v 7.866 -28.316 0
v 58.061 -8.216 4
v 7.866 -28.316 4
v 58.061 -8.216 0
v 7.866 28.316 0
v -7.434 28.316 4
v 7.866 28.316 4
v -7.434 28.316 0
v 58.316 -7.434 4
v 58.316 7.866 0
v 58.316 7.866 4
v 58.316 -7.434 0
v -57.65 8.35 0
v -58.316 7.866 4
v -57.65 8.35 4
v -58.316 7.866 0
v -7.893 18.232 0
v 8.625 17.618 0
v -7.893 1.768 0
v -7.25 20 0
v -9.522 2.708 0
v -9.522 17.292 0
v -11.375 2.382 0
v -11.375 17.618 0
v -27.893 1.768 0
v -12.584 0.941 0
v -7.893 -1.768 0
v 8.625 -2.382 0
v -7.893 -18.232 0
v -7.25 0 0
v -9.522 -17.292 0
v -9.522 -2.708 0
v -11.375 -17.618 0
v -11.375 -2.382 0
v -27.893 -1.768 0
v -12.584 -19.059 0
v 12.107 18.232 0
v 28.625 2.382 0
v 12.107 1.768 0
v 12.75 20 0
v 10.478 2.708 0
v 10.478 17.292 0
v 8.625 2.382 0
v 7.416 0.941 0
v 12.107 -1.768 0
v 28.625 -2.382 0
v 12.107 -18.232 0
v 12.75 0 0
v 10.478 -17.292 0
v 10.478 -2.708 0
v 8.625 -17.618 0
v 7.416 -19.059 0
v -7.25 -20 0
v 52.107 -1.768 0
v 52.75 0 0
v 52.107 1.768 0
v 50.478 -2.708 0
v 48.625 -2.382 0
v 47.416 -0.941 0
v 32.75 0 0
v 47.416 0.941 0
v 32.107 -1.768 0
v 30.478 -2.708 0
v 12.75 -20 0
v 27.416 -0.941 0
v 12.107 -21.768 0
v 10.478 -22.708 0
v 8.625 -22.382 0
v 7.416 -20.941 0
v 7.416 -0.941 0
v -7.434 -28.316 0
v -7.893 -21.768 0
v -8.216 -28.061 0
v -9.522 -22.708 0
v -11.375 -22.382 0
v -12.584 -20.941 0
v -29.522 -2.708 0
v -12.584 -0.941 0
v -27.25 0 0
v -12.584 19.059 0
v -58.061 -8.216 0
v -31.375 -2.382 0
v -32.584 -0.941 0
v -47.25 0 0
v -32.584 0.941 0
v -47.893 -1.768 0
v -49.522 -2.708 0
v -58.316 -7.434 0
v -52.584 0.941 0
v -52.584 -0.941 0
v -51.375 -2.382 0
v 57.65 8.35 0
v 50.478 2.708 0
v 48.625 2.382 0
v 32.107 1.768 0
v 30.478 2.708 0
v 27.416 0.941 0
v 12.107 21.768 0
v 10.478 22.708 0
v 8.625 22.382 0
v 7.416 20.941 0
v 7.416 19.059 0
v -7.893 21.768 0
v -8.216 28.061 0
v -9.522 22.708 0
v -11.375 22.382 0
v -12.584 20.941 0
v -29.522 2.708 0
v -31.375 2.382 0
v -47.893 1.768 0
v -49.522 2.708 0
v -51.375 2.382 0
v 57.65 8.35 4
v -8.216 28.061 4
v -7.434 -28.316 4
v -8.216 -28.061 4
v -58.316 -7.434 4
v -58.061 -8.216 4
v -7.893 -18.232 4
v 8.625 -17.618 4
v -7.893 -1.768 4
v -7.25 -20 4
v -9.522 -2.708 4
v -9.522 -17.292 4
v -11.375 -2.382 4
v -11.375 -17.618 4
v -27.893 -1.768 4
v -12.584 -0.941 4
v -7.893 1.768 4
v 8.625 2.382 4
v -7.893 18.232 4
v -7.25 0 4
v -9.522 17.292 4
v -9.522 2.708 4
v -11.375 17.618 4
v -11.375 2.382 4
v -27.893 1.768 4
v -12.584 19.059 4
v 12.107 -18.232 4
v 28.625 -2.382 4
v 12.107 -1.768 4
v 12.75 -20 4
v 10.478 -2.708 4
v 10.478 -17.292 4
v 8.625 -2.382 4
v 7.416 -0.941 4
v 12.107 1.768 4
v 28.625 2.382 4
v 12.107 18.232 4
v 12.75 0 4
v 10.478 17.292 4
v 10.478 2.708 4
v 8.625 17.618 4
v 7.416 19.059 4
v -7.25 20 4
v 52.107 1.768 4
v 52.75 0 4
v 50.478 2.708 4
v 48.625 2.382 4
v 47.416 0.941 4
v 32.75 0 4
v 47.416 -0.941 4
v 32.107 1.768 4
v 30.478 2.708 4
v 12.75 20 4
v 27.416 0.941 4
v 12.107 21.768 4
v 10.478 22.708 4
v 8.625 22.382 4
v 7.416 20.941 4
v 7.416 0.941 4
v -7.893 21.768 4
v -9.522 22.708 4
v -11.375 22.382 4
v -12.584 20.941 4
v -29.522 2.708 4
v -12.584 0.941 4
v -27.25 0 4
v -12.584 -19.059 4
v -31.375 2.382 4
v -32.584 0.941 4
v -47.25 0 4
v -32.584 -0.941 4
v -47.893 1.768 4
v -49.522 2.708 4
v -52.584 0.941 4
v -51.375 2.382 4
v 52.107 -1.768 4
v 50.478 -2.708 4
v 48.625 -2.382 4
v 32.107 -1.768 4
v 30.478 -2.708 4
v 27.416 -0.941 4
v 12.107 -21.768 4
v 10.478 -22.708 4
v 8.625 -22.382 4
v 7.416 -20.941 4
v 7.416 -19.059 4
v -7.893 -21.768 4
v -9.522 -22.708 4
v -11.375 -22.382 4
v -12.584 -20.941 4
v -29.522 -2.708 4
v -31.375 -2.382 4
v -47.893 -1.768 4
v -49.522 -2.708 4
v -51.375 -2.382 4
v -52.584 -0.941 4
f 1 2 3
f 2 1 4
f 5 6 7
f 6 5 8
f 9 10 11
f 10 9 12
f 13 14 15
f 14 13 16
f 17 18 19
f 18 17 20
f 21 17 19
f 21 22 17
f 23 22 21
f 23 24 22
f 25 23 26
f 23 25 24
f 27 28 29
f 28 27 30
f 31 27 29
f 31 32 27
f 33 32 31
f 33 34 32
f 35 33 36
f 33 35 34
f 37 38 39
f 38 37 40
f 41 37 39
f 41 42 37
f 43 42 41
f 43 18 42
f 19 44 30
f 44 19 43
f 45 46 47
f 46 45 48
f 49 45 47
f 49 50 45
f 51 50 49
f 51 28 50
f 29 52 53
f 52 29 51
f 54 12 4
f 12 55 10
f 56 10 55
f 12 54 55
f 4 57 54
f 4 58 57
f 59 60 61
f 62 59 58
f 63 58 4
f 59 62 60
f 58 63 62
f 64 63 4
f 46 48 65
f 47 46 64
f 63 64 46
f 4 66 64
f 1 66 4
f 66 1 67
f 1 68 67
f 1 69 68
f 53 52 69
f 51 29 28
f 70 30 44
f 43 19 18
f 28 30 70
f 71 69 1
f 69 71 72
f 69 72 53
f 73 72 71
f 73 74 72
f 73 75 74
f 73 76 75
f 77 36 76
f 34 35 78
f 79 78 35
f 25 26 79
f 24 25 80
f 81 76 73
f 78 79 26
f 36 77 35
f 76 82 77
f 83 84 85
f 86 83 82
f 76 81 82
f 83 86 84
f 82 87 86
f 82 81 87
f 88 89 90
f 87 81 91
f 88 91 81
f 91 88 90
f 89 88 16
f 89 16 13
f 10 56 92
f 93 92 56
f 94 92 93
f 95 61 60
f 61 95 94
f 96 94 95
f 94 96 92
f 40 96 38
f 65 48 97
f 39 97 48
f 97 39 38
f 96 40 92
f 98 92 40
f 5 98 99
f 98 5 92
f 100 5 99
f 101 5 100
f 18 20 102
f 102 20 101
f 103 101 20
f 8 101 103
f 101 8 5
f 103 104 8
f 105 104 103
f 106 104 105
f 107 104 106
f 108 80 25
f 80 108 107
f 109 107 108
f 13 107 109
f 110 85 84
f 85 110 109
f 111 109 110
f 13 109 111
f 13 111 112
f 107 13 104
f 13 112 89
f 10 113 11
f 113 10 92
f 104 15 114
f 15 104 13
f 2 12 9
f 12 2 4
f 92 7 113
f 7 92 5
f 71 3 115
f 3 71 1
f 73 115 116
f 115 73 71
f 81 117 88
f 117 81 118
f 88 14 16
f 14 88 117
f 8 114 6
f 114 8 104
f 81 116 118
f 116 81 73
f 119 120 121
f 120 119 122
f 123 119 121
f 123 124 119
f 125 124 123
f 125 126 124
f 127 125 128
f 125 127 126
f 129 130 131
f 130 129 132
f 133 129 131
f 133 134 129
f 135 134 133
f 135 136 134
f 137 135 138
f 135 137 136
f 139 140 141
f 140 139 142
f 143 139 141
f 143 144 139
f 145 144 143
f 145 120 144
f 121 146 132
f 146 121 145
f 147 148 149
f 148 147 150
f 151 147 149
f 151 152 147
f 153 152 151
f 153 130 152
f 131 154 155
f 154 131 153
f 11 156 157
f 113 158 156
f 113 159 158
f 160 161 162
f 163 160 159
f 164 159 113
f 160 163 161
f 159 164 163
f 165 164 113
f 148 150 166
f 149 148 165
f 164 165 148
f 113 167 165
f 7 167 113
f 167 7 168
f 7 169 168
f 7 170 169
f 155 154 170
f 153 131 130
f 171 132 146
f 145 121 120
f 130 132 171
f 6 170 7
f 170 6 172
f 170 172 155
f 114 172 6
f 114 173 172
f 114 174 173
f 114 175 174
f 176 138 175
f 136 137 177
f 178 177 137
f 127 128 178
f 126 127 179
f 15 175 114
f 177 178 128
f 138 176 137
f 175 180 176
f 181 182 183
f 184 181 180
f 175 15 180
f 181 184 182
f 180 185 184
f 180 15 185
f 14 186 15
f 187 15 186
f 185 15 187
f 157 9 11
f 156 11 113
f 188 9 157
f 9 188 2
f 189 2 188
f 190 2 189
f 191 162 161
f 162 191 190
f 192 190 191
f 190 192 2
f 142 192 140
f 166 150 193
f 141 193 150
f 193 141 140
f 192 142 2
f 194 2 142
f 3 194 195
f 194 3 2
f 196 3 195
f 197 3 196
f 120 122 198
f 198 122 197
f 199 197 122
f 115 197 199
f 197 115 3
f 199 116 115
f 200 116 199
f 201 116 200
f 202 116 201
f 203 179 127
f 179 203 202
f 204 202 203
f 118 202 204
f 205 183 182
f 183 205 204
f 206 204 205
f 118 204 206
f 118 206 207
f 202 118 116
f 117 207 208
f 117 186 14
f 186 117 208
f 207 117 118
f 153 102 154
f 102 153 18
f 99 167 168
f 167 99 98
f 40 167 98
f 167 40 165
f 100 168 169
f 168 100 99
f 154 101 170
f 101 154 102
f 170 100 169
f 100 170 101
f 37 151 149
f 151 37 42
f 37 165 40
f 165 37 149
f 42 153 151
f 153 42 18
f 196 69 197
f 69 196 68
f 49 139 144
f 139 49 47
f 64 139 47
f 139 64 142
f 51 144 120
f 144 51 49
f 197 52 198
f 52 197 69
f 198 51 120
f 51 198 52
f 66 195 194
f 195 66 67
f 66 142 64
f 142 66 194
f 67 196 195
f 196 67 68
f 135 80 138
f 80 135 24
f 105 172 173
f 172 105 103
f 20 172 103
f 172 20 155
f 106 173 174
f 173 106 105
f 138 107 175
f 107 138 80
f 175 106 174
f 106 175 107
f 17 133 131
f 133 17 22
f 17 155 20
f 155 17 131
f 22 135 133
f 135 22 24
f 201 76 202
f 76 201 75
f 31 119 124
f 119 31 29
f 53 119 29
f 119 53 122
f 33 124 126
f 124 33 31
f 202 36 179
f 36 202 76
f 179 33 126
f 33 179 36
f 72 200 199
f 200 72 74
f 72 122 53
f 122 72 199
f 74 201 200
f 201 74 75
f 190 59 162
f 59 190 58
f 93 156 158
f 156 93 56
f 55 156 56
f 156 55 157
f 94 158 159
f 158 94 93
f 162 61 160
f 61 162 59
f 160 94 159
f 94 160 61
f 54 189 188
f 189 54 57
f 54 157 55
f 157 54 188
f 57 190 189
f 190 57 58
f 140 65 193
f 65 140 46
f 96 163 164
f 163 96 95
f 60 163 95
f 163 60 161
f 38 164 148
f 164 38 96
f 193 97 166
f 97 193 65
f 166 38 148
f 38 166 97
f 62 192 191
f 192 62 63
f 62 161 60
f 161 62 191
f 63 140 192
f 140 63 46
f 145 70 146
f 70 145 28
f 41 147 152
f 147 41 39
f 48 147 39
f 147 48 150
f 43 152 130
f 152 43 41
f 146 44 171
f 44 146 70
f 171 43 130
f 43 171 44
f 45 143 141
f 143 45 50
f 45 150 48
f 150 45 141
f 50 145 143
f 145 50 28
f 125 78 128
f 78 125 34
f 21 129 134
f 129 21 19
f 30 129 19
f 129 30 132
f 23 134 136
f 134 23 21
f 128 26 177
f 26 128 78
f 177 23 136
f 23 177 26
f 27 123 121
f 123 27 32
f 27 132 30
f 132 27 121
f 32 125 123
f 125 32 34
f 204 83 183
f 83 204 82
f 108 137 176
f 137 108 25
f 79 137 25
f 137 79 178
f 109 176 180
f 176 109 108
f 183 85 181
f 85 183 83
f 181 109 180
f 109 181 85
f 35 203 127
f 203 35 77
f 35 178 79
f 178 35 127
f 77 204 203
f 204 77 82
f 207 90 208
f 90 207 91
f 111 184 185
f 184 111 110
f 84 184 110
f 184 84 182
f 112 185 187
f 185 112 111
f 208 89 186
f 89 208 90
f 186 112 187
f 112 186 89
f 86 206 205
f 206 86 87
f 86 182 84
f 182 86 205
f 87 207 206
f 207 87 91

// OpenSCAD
// rob@openpart.co.uk 20140202-23:00
// 10 hole cross joining plate for 40mm & 20mm NOMINAL extrusion
// V-Slot & others

module roundedRect(size, radius)
{
	x = size[0];
	y = size[1];
	z = size[2];
	linear_extrude(height=z)
	hull()
	{
		// place 4 circles in the corners, with the given radius
		translate([(-x/2)+(radius/2), (-y/2)+(radius/2), 0])
		circle(r=radius);
		translate([(x/2)-(radius/2), (-y/2)+(radius/2), 0])
		circle(r=radius);
		translate([(-x/2)+(radius/2), (y/2)-(radius/2), 0])
		circle(r=radius);
		translate([(x/2)-(radius/2), (y/2)-(radius/2), 0])
		circle(r=radius);
	}
}

hole = 5.5 / 2;
plate_width1 = 56;
plate_width2 = 116;
plate_length = 16;
plate_thickness = 4;
extend_past_thickness = 2;
corner_radius = 0.7;
difference () {
hull () {
	translate([0, 0, 0])
		roundedRect ([plate_length, plate_width1, plate_thickness], corner_radius);
	rotate (90,0,0) {

	translate([0, 0, 0])
		roundedRect ([plate_length, plate_width2, plate_thickness], corner_radius);
}}

	translate([10,20,-1])
		cylinder(h = (extend_past_thickness+plate_thickness+2), r = hole);
	translate([10,-20,-1])
		cylinder(h = (extend_past_thickness+plate_thickness+2), r = hole);

	translate([-10,20,-1])
		cylinder(h = (extend_past_thickness+plate_thickness+2), r = hole);
	translate([-10,-20,-1])
		cylinder(h = (extend_past_thickness+plate_thickness+2), r = hole);

	translate([50,0,-1])
		cylinder(h = (extend_past_thickness+plate_thickness+2), r = hole);
	translate([30,0,-1])
		cylinder(h = (extend_past_thickness+plate_thickness+2), r = hole);
	translate([10,0,-1])
		cylinder(h = (extend_past_thickness+plate_thickness+2), r = hole);
	translate([-10,0,-1])
		cylinder(h = (extend_past_thickness+plate_thickness+2), r = hole);
	translate([-30,0,-1])
		cylinder(h = (extend_past_thickness+plate_thickness+2), r = hole);
	translate([-50,0,-1])
		cylinder(h = (extend_past_thickness+plate_thickness+2), r = hole);

}
	
